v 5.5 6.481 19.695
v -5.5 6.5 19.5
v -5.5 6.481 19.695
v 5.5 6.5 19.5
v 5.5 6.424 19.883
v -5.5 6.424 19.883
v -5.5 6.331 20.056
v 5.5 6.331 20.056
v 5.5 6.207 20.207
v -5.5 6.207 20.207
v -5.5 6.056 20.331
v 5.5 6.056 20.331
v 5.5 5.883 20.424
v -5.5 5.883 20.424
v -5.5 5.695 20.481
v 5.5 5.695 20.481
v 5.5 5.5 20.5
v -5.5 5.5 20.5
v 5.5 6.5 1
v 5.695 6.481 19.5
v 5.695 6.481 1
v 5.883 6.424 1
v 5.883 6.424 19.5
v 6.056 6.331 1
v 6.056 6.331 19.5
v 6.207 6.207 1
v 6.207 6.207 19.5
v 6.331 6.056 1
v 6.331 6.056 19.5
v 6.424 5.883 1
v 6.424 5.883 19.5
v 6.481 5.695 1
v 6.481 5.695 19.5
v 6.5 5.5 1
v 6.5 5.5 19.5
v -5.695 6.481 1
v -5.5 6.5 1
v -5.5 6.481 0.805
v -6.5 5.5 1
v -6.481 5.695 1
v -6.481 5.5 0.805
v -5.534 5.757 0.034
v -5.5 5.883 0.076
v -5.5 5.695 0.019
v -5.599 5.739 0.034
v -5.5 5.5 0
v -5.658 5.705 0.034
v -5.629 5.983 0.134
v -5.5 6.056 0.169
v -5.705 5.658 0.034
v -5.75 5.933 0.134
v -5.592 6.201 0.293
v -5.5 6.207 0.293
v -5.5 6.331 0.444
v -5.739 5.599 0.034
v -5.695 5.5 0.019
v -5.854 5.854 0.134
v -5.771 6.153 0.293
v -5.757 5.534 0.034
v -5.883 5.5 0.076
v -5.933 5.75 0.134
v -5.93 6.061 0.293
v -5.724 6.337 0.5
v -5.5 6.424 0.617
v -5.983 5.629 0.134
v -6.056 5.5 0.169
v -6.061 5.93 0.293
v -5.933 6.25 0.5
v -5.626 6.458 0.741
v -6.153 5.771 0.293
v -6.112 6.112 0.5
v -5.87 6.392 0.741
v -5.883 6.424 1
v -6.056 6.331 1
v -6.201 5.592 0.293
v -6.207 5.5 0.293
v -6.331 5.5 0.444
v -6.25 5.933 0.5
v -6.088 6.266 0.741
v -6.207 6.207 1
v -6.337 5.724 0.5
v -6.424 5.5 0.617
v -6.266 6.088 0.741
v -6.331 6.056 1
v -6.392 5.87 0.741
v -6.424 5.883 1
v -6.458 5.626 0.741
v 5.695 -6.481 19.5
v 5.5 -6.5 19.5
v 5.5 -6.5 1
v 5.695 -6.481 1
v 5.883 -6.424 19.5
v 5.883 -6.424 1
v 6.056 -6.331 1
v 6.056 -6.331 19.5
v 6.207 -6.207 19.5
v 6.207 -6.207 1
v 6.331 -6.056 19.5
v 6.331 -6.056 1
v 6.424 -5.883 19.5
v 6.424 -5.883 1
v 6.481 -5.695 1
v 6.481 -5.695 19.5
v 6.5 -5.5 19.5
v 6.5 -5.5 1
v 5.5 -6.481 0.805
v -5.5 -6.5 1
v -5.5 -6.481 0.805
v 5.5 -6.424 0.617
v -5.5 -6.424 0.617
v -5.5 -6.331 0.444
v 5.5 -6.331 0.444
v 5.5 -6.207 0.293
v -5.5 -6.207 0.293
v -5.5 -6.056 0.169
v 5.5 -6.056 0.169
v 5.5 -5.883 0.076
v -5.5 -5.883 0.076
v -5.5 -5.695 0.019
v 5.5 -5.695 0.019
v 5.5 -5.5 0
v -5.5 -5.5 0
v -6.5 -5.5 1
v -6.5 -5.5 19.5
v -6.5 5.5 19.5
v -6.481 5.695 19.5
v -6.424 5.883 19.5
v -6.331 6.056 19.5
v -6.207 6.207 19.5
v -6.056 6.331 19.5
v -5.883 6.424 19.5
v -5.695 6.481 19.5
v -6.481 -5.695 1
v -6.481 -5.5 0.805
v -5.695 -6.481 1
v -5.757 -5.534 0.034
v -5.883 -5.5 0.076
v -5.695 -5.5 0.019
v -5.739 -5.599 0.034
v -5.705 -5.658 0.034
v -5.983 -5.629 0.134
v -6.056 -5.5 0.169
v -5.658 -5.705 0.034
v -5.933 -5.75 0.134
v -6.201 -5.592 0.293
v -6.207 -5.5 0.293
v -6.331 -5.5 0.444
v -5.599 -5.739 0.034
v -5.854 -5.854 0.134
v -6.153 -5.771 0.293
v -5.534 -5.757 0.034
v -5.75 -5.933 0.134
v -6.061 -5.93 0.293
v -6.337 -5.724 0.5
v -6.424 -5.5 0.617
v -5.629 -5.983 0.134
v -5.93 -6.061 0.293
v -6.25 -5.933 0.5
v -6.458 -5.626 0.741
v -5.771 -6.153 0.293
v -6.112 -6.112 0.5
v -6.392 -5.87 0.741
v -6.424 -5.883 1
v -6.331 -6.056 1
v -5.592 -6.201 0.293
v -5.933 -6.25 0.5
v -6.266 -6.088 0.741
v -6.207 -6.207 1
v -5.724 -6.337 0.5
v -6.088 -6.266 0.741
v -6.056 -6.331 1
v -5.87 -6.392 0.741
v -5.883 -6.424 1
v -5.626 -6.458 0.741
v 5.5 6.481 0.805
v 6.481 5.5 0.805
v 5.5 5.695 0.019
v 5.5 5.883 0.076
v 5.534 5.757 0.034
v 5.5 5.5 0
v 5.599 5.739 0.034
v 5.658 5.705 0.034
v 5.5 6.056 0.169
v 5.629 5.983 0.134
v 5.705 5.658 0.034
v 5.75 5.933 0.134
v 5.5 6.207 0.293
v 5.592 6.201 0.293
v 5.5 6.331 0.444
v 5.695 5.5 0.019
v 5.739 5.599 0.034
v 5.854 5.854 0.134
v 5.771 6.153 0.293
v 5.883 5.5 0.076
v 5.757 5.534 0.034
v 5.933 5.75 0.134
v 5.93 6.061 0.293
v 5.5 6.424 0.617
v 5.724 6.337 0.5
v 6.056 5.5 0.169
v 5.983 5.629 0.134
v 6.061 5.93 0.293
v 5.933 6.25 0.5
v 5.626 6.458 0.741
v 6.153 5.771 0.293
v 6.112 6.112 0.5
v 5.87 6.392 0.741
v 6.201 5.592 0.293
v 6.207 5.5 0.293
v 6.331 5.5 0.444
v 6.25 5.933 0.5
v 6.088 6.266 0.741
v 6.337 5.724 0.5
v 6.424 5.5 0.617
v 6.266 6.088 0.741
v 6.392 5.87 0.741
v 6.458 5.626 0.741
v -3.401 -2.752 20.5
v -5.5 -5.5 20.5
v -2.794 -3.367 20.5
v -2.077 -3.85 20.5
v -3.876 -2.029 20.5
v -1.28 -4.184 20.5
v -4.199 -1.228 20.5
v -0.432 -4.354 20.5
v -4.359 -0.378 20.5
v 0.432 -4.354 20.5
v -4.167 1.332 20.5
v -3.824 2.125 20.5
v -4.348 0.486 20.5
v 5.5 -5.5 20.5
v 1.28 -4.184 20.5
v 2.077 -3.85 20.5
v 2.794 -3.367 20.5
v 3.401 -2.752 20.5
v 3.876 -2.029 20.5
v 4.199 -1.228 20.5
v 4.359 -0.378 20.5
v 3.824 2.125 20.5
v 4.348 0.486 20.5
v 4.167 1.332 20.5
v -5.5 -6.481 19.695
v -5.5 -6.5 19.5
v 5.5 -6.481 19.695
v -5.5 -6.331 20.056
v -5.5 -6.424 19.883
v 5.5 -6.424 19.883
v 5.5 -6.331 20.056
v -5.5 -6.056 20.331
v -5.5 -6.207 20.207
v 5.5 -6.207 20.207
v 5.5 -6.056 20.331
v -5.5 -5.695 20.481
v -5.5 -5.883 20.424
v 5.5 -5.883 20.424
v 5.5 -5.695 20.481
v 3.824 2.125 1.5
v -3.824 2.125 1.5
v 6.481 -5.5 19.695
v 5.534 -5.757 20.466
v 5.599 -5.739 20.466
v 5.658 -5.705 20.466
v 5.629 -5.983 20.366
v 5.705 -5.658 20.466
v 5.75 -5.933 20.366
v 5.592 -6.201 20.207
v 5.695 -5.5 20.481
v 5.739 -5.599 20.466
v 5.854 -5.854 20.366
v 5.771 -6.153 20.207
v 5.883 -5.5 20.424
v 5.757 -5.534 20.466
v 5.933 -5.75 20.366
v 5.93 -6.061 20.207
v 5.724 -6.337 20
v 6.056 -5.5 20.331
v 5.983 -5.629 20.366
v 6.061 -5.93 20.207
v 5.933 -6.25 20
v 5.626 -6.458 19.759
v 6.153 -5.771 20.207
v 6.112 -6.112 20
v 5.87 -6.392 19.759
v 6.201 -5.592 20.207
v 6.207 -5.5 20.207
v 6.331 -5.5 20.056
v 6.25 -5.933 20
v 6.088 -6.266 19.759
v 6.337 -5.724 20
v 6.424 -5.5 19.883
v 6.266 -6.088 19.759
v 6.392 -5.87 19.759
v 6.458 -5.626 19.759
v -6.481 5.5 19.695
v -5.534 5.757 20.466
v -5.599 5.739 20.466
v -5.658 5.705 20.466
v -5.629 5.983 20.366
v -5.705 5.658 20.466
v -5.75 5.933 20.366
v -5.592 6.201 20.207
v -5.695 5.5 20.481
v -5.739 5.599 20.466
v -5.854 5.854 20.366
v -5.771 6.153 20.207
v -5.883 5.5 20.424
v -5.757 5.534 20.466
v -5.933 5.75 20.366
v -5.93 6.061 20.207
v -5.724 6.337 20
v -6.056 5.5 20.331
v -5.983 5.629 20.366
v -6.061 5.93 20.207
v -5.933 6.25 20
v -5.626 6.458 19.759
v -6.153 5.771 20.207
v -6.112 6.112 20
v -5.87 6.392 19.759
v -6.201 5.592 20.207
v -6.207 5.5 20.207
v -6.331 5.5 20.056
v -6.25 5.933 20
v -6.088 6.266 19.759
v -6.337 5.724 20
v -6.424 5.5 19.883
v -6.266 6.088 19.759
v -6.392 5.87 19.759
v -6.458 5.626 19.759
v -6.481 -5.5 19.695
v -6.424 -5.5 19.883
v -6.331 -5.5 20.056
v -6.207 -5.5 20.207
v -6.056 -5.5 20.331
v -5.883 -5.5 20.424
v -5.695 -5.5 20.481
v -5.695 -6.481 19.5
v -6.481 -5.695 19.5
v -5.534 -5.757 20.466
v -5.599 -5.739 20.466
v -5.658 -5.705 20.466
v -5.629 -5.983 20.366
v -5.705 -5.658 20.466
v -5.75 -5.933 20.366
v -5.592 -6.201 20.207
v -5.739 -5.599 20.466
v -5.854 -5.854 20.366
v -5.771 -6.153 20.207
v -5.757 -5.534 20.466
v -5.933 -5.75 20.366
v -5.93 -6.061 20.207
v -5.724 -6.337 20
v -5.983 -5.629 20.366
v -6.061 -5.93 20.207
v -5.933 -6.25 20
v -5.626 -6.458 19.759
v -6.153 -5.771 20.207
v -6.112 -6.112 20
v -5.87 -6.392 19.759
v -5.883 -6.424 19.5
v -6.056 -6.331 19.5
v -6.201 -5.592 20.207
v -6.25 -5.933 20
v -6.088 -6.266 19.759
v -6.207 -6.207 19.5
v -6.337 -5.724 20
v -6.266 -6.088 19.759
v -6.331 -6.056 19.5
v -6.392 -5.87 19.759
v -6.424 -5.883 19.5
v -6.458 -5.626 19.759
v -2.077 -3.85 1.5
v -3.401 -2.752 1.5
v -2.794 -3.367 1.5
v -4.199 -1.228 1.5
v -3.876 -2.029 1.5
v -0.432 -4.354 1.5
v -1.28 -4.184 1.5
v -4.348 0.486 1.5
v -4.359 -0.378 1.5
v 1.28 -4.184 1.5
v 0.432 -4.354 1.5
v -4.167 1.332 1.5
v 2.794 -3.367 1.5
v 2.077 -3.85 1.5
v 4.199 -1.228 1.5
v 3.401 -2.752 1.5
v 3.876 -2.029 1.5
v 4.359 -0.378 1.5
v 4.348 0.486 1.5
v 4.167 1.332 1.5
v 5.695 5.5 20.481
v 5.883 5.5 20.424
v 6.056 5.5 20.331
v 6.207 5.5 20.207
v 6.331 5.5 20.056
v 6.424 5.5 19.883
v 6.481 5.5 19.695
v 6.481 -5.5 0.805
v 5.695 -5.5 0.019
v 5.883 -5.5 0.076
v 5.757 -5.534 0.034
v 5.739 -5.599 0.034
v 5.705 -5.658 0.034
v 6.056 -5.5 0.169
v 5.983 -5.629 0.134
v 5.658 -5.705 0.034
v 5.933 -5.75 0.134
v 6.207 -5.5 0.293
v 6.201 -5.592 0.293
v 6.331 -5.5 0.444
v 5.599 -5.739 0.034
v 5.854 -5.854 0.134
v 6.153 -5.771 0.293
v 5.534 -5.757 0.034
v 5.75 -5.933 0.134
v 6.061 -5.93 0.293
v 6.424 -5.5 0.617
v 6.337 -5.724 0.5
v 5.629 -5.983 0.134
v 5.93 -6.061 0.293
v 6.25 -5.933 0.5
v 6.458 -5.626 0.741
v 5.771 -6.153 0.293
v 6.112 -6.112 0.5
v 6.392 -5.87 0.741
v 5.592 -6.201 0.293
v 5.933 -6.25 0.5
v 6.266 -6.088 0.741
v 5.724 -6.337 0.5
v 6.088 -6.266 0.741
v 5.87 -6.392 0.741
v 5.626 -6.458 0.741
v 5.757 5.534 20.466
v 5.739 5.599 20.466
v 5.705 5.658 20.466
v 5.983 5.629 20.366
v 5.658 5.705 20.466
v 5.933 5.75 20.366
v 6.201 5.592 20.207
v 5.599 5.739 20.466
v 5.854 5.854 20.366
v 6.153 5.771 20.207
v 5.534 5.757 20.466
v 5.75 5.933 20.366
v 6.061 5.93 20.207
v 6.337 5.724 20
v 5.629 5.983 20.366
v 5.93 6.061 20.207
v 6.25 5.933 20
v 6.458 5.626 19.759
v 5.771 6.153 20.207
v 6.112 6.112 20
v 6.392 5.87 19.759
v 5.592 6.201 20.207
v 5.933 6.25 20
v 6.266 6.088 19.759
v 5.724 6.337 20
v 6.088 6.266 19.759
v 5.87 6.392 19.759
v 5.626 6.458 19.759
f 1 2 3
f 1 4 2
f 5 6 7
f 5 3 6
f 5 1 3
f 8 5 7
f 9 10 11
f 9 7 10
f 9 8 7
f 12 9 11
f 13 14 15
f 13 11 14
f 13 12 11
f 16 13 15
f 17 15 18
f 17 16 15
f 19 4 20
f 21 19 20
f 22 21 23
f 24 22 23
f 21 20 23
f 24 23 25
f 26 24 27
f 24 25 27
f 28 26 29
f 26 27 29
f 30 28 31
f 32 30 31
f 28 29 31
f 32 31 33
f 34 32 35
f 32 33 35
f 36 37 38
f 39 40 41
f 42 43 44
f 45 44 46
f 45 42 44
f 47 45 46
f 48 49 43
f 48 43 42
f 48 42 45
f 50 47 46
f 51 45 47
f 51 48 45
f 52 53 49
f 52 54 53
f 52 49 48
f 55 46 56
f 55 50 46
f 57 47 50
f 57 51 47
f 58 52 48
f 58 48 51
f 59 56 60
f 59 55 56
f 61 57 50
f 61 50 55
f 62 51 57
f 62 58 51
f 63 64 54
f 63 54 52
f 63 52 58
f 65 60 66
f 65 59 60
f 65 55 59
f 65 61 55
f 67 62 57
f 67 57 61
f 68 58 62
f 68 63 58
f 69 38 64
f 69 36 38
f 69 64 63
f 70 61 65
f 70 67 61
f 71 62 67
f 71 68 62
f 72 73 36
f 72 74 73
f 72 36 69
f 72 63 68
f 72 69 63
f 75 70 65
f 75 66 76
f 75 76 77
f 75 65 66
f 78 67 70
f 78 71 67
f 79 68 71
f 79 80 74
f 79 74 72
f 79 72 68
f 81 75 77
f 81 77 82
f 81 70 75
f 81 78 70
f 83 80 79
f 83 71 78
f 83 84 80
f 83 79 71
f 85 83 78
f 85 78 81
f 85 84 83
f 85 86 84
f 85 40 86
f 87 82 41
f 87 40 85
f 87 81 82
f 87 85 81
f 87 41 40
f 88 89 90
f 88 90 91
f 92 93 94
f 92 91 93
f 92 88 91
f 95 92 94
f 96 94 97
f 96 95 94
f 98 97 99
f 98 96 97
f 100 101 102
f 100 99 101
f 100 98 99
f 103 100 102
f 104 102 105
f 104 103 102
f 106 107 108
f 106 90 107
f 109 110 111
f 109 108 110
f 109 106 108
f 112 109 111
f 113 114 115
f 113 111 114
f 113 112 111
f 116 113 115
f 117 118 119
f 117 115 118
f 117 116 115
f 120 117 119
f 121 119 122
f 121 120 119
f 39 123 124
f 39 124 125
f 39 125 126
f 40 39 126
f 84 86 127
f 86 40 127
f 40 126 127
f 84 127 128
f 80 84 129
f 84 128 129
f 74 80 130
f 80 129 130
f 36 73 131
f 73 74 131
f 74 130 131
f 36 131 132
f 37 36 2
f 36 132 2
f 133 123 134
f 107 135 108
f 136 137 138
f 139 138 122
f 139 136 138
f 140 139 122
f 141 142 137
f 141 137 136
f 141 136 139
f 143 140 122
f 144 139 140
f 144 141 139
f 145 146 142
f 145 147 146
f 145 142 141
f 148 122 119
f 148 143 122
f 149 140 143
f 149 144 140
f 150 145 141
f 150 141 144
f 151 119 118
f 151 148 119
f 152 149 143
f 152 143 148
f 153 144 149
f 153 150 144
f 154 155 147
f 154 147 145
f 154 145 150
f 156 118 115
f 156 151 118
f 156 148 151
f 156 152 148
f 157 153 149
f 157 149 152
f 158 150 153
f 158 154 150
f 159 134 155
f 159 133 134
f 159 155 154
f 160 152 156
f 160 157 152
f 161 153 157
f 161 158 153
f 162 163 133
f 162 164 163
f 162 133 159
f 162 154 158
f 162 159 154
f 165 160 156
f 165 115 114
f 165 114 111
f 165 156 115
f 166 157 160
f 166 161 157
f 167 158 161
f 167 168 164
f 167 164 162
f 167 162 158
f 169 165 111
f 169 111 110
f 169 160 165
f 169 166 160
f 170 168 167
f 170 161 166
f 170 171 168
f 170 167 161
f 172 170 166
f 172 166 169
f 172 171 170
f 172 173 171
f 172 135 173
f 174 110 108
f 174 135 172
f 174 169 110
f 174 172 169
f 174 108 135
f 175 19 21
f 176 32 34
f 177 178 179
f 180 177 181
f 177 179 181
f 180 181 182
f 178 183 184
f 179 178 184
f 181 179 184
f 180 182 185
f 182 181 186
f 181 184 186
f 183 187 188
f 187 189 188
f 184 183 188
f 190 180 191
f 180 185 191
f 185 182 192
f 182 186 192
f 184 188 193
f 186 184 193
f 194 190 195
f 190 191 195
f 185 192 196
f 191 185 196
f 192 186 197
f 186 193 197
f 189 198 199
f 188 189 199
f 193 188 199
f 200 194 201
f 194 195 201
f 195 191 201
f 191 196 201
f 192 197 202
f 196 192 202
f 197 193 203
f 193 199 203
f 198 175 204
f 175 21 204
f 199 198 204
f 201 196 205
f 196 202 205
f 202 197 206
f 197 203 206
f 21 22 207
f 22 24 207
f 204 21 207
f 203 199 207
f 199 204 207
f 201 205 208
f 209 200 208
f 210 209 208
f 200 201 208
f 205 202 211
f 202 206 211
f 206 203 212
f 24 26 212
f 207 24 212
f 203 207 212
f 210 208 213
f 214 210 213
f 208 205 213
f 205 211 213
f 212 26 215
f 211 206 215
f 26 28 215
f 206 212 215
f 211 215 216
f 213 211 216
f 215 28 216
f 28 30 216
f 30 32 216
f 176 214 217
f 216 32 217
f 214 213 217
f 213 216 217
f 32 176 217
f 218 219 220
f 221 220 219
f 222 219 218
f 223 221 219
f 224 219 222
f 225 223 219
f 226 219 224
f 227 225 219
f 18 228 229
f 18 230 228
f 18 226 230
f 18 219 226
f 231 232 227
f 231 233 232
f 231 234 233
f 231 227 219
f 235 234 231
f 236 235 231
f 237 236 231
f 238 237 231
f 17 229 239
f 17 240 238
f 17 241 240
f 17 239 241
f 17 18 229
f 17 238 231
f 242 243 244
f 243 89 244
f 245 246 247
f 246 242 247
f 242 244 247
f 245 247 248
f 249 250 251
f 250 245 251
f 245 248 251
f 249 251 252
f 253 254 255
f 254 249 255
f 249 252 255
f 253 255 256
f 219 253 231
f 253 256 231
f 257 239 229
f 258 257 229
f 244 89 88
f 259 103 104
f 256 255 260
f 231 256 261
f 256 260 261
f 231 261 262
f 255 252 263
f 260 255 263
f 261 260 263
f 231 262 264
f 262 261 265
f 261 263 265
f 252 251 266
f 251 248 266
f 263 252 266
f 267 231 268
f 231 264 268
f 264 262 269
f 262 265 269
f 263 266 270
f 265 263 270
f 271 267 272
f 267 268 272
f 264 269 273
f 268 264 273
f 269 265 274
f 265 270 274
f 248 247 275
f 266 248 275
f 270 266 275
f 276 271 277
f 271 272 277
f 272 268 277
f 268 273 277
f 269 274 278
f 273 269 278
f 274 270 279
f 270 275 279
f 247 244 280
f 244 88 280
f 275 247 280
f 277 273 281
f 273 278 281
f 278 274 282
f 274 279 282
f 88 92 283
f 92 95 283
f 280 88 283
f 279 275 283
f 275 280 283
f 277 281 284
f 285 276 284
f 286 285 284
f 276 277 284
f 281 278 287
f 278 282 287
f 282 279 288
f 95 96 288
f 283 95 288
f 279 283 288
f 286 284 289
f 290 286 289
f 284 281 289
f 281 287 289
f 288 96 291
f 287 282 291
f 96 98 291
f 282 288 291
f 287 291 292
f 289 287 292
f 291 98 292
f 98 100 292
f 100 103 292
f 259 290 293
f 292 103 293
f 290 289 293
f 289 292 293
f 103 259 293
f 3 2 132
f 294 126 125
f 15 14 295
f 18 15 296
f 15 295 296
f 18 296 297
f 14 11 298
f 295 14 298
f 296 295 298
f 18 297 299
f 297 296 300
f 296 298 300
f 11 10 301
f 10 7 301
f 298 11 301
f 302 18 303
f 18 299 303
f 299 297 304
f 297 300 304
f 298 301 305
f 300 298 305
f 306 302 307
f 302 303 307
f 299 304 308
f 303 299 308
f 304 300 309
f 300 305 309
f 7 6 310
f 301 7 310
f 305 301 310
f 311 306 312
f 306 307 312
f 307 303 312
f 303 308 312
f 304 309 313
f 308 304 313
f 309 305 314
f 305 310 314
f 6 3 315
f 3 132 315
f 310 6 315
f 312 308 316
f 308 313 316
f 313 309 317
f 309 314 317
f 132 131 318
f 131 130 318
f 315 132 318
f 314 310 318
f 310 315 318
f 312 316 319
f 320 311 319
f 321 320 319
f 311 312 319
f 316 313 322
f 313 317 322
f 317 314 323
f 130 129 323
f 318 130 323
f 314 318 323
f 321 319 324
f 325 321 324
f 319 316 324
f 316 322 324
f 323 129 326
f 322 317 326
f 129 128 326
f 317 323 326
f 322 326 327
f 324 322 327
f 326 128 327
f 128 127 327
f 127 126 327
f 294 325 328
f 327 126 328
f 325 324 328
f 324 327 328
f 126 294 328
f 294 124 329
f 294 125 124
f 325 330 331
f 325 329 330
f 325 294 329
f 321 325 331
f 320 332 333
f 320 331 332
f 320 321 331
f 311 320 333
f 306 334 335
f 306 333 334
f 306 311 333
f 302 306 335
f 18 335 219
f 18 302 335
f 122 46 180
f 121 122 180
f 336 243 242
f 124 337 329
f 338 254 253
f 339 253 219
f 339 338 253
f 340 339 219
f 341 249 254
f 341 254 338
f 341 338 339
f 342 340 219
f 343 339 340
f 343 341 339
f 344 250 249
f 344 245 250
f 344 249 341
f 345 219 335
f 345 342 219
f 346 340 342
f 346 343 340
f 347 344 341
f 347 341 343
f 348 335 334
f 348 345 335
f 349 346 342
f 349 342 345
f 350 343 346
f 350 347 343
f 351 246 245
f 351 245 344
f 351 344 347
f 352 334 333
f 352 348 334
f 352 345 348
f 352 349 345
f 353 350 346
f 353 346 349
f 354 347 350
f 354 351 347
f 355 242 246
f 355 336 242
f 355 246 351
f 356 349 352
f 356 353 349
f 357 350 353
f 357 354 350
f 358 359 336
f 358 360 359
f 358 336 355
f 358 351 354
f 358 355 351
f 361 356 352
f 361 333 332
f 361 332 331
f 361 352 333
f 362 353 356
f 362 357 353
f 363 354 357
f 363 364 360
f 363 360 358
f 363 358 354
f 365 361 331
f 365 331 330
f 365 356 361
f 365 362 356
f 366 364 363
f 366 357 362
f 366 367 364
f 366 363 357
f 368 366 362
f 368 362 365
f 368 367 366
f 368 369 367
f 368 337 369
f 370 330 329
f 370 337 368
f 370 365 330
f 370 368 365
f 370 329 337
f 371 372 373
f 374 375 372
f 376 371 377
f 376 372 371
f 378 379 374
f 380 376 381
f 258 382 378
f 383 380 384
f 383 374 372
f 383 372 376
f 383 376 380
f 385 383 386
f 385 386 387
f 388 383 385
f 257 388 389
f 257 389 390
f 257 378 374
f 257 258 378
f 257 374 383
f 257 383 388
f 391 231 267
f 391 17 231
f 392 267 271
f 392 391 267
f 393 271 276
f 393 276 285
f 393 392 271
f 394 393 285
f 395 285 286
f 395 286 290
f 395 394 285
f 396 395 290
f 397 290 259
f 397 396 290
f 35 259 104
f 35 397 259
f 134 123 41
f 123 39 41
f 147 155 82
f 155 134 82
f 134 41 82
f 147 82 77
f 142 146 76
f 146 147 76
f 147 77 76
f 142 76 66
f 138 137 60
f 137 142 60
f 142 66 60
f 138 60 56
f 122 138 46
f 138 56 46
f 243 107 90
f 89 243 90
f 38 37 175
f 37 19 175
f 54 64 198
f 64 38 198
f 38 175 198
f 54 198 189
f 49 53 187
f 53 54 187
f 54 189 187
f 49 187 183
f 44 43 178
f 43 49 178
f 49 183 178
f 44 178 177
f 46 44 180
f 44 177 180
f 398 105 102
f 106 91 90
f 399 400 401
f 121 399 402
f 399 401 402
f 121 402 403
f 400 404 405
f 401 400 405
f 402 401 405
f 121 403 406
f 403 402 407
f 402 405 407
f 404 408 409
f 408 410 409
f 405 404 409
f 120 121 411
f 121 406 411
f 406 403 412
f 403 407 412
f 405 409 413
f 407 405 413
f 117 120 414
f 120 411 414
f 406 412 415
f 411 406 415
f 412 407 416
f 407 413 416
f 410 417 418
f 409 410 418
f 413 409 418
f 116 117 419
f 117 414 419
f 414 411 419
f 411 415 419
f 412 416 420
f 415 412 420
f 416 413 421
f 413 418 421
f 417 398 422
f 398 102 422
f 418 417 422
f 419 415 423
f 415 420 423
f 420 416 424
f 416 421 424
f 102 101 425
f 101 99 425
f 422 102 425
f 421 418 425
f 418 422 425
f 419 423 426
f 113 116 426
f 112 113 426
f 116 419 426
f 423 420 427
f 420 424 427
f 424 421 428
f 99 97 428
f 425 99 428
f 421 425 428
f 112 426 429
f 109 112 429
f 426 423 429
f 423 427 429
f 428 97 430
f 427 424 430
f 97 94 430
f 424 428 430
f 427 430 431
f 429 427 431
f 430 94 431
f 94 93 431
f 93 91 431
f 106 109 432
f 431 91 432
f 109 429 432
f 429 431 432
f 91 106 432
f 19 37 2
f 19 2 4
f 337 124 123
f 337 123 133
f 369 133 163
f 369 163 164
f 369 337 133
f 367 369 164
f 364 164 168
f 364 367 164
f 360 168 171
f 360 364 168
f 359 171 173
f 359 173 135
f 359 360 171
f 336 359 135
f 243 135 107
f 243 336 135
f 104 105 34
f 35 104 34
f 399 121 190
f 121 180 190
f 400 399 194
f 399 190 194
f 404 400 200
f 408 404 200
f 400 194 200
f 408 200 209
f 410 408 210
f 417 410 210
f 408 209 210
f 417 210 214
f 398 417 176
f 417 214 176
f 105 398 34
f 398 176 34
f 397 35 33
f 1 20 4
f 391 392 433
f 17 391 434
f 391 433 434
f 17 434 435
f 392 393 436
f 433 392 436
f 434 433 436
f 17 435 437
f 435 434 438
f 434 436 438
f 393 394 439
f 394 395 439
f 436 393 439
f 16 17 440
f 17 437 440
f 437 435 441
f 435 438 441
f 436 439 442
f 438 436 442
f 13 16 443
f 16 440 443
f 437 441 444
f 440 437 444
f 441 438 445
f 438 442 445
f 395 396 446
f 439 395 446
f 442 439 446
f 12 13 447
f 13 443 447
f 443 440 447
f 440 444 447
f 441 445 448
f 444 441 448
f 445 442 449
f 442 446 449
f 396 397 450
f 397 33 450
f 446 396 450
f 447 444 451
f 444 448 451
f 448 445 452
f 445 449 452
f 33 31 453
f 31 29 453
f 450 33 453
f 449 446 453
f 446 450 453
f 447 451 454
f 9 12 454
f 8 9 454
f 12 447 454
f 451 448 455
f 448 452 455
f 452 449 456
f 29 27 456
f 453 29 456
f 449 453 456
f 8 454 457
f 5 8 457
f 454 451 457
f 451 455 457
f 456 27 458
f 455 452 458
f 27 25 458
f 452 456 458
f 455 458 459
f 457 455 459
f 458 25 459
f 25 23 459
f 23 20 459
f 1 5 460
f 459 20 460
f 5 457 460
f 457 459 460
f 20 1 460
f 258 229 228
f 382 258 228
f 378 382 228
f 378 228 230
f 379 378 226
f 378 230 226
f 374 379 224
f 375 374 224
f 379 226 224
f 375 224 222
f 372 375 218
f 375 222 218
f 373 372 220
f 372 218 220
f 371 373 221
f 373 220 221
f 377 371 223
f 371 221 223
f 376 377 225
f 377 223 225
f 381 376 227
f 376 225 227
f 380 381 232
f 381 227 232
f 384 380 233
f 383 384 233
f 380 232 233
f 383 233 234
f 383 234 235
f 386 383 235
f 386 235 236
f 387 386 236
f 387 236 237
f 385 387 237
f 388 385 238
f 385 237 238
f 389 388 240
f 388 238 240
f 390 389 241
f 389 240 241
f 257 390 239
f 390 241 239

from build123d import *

# Parameters (mm, degrees)
F0_W     = 13
F0_H     = 13
F1_DEPTH = 20.5
F3_DEPTH = 19
F4_R     = 1


with BuildPart() as f1:
    # F0 (on Top) → F1 (new body)
    with BuildSketch(Plane.XY):
        Rectangle(F0_W, F0_H)
    extrude(amount=F1_DEPTH)

    # F2 (on face) → F3 (cut)
    with BuildSketch(Plane.XY.offset(20.5)):
        with BuildLine():
            Line((3.824265, 2.125), (-3.824265, 2.125))
            ThreePointArc((-3.824265, 2.125), (0, -4.375), (3.824265, 2.125))
        make_face()
    extrude(amount=-F3_DEPTH, mode=Mode.SUBTRACT)

    # F4
    f4_edges = [f1.edges().sort_by_distance(p)[0] for p in [
        (-6.5, 6.5, 10.25),
        (-6.5, -6.5, 10.25),
        (6.5, -6.5, 10.25),
        (6.5, 6.5, 10.25),
        (0, 6.5, 0),
        (-6.5, 0, 0),
        (6.5, 0, 0),
        (0, -6.5, 0),
        (0, -6.5, 20.5),
        (6.5, 0, 20.5),
        (0, 6.5, 20.5),
        (-6.5, 0, 20.5),
    ]]
    fillet(f4_edges, radius=F4_R)


solid = f1.part
